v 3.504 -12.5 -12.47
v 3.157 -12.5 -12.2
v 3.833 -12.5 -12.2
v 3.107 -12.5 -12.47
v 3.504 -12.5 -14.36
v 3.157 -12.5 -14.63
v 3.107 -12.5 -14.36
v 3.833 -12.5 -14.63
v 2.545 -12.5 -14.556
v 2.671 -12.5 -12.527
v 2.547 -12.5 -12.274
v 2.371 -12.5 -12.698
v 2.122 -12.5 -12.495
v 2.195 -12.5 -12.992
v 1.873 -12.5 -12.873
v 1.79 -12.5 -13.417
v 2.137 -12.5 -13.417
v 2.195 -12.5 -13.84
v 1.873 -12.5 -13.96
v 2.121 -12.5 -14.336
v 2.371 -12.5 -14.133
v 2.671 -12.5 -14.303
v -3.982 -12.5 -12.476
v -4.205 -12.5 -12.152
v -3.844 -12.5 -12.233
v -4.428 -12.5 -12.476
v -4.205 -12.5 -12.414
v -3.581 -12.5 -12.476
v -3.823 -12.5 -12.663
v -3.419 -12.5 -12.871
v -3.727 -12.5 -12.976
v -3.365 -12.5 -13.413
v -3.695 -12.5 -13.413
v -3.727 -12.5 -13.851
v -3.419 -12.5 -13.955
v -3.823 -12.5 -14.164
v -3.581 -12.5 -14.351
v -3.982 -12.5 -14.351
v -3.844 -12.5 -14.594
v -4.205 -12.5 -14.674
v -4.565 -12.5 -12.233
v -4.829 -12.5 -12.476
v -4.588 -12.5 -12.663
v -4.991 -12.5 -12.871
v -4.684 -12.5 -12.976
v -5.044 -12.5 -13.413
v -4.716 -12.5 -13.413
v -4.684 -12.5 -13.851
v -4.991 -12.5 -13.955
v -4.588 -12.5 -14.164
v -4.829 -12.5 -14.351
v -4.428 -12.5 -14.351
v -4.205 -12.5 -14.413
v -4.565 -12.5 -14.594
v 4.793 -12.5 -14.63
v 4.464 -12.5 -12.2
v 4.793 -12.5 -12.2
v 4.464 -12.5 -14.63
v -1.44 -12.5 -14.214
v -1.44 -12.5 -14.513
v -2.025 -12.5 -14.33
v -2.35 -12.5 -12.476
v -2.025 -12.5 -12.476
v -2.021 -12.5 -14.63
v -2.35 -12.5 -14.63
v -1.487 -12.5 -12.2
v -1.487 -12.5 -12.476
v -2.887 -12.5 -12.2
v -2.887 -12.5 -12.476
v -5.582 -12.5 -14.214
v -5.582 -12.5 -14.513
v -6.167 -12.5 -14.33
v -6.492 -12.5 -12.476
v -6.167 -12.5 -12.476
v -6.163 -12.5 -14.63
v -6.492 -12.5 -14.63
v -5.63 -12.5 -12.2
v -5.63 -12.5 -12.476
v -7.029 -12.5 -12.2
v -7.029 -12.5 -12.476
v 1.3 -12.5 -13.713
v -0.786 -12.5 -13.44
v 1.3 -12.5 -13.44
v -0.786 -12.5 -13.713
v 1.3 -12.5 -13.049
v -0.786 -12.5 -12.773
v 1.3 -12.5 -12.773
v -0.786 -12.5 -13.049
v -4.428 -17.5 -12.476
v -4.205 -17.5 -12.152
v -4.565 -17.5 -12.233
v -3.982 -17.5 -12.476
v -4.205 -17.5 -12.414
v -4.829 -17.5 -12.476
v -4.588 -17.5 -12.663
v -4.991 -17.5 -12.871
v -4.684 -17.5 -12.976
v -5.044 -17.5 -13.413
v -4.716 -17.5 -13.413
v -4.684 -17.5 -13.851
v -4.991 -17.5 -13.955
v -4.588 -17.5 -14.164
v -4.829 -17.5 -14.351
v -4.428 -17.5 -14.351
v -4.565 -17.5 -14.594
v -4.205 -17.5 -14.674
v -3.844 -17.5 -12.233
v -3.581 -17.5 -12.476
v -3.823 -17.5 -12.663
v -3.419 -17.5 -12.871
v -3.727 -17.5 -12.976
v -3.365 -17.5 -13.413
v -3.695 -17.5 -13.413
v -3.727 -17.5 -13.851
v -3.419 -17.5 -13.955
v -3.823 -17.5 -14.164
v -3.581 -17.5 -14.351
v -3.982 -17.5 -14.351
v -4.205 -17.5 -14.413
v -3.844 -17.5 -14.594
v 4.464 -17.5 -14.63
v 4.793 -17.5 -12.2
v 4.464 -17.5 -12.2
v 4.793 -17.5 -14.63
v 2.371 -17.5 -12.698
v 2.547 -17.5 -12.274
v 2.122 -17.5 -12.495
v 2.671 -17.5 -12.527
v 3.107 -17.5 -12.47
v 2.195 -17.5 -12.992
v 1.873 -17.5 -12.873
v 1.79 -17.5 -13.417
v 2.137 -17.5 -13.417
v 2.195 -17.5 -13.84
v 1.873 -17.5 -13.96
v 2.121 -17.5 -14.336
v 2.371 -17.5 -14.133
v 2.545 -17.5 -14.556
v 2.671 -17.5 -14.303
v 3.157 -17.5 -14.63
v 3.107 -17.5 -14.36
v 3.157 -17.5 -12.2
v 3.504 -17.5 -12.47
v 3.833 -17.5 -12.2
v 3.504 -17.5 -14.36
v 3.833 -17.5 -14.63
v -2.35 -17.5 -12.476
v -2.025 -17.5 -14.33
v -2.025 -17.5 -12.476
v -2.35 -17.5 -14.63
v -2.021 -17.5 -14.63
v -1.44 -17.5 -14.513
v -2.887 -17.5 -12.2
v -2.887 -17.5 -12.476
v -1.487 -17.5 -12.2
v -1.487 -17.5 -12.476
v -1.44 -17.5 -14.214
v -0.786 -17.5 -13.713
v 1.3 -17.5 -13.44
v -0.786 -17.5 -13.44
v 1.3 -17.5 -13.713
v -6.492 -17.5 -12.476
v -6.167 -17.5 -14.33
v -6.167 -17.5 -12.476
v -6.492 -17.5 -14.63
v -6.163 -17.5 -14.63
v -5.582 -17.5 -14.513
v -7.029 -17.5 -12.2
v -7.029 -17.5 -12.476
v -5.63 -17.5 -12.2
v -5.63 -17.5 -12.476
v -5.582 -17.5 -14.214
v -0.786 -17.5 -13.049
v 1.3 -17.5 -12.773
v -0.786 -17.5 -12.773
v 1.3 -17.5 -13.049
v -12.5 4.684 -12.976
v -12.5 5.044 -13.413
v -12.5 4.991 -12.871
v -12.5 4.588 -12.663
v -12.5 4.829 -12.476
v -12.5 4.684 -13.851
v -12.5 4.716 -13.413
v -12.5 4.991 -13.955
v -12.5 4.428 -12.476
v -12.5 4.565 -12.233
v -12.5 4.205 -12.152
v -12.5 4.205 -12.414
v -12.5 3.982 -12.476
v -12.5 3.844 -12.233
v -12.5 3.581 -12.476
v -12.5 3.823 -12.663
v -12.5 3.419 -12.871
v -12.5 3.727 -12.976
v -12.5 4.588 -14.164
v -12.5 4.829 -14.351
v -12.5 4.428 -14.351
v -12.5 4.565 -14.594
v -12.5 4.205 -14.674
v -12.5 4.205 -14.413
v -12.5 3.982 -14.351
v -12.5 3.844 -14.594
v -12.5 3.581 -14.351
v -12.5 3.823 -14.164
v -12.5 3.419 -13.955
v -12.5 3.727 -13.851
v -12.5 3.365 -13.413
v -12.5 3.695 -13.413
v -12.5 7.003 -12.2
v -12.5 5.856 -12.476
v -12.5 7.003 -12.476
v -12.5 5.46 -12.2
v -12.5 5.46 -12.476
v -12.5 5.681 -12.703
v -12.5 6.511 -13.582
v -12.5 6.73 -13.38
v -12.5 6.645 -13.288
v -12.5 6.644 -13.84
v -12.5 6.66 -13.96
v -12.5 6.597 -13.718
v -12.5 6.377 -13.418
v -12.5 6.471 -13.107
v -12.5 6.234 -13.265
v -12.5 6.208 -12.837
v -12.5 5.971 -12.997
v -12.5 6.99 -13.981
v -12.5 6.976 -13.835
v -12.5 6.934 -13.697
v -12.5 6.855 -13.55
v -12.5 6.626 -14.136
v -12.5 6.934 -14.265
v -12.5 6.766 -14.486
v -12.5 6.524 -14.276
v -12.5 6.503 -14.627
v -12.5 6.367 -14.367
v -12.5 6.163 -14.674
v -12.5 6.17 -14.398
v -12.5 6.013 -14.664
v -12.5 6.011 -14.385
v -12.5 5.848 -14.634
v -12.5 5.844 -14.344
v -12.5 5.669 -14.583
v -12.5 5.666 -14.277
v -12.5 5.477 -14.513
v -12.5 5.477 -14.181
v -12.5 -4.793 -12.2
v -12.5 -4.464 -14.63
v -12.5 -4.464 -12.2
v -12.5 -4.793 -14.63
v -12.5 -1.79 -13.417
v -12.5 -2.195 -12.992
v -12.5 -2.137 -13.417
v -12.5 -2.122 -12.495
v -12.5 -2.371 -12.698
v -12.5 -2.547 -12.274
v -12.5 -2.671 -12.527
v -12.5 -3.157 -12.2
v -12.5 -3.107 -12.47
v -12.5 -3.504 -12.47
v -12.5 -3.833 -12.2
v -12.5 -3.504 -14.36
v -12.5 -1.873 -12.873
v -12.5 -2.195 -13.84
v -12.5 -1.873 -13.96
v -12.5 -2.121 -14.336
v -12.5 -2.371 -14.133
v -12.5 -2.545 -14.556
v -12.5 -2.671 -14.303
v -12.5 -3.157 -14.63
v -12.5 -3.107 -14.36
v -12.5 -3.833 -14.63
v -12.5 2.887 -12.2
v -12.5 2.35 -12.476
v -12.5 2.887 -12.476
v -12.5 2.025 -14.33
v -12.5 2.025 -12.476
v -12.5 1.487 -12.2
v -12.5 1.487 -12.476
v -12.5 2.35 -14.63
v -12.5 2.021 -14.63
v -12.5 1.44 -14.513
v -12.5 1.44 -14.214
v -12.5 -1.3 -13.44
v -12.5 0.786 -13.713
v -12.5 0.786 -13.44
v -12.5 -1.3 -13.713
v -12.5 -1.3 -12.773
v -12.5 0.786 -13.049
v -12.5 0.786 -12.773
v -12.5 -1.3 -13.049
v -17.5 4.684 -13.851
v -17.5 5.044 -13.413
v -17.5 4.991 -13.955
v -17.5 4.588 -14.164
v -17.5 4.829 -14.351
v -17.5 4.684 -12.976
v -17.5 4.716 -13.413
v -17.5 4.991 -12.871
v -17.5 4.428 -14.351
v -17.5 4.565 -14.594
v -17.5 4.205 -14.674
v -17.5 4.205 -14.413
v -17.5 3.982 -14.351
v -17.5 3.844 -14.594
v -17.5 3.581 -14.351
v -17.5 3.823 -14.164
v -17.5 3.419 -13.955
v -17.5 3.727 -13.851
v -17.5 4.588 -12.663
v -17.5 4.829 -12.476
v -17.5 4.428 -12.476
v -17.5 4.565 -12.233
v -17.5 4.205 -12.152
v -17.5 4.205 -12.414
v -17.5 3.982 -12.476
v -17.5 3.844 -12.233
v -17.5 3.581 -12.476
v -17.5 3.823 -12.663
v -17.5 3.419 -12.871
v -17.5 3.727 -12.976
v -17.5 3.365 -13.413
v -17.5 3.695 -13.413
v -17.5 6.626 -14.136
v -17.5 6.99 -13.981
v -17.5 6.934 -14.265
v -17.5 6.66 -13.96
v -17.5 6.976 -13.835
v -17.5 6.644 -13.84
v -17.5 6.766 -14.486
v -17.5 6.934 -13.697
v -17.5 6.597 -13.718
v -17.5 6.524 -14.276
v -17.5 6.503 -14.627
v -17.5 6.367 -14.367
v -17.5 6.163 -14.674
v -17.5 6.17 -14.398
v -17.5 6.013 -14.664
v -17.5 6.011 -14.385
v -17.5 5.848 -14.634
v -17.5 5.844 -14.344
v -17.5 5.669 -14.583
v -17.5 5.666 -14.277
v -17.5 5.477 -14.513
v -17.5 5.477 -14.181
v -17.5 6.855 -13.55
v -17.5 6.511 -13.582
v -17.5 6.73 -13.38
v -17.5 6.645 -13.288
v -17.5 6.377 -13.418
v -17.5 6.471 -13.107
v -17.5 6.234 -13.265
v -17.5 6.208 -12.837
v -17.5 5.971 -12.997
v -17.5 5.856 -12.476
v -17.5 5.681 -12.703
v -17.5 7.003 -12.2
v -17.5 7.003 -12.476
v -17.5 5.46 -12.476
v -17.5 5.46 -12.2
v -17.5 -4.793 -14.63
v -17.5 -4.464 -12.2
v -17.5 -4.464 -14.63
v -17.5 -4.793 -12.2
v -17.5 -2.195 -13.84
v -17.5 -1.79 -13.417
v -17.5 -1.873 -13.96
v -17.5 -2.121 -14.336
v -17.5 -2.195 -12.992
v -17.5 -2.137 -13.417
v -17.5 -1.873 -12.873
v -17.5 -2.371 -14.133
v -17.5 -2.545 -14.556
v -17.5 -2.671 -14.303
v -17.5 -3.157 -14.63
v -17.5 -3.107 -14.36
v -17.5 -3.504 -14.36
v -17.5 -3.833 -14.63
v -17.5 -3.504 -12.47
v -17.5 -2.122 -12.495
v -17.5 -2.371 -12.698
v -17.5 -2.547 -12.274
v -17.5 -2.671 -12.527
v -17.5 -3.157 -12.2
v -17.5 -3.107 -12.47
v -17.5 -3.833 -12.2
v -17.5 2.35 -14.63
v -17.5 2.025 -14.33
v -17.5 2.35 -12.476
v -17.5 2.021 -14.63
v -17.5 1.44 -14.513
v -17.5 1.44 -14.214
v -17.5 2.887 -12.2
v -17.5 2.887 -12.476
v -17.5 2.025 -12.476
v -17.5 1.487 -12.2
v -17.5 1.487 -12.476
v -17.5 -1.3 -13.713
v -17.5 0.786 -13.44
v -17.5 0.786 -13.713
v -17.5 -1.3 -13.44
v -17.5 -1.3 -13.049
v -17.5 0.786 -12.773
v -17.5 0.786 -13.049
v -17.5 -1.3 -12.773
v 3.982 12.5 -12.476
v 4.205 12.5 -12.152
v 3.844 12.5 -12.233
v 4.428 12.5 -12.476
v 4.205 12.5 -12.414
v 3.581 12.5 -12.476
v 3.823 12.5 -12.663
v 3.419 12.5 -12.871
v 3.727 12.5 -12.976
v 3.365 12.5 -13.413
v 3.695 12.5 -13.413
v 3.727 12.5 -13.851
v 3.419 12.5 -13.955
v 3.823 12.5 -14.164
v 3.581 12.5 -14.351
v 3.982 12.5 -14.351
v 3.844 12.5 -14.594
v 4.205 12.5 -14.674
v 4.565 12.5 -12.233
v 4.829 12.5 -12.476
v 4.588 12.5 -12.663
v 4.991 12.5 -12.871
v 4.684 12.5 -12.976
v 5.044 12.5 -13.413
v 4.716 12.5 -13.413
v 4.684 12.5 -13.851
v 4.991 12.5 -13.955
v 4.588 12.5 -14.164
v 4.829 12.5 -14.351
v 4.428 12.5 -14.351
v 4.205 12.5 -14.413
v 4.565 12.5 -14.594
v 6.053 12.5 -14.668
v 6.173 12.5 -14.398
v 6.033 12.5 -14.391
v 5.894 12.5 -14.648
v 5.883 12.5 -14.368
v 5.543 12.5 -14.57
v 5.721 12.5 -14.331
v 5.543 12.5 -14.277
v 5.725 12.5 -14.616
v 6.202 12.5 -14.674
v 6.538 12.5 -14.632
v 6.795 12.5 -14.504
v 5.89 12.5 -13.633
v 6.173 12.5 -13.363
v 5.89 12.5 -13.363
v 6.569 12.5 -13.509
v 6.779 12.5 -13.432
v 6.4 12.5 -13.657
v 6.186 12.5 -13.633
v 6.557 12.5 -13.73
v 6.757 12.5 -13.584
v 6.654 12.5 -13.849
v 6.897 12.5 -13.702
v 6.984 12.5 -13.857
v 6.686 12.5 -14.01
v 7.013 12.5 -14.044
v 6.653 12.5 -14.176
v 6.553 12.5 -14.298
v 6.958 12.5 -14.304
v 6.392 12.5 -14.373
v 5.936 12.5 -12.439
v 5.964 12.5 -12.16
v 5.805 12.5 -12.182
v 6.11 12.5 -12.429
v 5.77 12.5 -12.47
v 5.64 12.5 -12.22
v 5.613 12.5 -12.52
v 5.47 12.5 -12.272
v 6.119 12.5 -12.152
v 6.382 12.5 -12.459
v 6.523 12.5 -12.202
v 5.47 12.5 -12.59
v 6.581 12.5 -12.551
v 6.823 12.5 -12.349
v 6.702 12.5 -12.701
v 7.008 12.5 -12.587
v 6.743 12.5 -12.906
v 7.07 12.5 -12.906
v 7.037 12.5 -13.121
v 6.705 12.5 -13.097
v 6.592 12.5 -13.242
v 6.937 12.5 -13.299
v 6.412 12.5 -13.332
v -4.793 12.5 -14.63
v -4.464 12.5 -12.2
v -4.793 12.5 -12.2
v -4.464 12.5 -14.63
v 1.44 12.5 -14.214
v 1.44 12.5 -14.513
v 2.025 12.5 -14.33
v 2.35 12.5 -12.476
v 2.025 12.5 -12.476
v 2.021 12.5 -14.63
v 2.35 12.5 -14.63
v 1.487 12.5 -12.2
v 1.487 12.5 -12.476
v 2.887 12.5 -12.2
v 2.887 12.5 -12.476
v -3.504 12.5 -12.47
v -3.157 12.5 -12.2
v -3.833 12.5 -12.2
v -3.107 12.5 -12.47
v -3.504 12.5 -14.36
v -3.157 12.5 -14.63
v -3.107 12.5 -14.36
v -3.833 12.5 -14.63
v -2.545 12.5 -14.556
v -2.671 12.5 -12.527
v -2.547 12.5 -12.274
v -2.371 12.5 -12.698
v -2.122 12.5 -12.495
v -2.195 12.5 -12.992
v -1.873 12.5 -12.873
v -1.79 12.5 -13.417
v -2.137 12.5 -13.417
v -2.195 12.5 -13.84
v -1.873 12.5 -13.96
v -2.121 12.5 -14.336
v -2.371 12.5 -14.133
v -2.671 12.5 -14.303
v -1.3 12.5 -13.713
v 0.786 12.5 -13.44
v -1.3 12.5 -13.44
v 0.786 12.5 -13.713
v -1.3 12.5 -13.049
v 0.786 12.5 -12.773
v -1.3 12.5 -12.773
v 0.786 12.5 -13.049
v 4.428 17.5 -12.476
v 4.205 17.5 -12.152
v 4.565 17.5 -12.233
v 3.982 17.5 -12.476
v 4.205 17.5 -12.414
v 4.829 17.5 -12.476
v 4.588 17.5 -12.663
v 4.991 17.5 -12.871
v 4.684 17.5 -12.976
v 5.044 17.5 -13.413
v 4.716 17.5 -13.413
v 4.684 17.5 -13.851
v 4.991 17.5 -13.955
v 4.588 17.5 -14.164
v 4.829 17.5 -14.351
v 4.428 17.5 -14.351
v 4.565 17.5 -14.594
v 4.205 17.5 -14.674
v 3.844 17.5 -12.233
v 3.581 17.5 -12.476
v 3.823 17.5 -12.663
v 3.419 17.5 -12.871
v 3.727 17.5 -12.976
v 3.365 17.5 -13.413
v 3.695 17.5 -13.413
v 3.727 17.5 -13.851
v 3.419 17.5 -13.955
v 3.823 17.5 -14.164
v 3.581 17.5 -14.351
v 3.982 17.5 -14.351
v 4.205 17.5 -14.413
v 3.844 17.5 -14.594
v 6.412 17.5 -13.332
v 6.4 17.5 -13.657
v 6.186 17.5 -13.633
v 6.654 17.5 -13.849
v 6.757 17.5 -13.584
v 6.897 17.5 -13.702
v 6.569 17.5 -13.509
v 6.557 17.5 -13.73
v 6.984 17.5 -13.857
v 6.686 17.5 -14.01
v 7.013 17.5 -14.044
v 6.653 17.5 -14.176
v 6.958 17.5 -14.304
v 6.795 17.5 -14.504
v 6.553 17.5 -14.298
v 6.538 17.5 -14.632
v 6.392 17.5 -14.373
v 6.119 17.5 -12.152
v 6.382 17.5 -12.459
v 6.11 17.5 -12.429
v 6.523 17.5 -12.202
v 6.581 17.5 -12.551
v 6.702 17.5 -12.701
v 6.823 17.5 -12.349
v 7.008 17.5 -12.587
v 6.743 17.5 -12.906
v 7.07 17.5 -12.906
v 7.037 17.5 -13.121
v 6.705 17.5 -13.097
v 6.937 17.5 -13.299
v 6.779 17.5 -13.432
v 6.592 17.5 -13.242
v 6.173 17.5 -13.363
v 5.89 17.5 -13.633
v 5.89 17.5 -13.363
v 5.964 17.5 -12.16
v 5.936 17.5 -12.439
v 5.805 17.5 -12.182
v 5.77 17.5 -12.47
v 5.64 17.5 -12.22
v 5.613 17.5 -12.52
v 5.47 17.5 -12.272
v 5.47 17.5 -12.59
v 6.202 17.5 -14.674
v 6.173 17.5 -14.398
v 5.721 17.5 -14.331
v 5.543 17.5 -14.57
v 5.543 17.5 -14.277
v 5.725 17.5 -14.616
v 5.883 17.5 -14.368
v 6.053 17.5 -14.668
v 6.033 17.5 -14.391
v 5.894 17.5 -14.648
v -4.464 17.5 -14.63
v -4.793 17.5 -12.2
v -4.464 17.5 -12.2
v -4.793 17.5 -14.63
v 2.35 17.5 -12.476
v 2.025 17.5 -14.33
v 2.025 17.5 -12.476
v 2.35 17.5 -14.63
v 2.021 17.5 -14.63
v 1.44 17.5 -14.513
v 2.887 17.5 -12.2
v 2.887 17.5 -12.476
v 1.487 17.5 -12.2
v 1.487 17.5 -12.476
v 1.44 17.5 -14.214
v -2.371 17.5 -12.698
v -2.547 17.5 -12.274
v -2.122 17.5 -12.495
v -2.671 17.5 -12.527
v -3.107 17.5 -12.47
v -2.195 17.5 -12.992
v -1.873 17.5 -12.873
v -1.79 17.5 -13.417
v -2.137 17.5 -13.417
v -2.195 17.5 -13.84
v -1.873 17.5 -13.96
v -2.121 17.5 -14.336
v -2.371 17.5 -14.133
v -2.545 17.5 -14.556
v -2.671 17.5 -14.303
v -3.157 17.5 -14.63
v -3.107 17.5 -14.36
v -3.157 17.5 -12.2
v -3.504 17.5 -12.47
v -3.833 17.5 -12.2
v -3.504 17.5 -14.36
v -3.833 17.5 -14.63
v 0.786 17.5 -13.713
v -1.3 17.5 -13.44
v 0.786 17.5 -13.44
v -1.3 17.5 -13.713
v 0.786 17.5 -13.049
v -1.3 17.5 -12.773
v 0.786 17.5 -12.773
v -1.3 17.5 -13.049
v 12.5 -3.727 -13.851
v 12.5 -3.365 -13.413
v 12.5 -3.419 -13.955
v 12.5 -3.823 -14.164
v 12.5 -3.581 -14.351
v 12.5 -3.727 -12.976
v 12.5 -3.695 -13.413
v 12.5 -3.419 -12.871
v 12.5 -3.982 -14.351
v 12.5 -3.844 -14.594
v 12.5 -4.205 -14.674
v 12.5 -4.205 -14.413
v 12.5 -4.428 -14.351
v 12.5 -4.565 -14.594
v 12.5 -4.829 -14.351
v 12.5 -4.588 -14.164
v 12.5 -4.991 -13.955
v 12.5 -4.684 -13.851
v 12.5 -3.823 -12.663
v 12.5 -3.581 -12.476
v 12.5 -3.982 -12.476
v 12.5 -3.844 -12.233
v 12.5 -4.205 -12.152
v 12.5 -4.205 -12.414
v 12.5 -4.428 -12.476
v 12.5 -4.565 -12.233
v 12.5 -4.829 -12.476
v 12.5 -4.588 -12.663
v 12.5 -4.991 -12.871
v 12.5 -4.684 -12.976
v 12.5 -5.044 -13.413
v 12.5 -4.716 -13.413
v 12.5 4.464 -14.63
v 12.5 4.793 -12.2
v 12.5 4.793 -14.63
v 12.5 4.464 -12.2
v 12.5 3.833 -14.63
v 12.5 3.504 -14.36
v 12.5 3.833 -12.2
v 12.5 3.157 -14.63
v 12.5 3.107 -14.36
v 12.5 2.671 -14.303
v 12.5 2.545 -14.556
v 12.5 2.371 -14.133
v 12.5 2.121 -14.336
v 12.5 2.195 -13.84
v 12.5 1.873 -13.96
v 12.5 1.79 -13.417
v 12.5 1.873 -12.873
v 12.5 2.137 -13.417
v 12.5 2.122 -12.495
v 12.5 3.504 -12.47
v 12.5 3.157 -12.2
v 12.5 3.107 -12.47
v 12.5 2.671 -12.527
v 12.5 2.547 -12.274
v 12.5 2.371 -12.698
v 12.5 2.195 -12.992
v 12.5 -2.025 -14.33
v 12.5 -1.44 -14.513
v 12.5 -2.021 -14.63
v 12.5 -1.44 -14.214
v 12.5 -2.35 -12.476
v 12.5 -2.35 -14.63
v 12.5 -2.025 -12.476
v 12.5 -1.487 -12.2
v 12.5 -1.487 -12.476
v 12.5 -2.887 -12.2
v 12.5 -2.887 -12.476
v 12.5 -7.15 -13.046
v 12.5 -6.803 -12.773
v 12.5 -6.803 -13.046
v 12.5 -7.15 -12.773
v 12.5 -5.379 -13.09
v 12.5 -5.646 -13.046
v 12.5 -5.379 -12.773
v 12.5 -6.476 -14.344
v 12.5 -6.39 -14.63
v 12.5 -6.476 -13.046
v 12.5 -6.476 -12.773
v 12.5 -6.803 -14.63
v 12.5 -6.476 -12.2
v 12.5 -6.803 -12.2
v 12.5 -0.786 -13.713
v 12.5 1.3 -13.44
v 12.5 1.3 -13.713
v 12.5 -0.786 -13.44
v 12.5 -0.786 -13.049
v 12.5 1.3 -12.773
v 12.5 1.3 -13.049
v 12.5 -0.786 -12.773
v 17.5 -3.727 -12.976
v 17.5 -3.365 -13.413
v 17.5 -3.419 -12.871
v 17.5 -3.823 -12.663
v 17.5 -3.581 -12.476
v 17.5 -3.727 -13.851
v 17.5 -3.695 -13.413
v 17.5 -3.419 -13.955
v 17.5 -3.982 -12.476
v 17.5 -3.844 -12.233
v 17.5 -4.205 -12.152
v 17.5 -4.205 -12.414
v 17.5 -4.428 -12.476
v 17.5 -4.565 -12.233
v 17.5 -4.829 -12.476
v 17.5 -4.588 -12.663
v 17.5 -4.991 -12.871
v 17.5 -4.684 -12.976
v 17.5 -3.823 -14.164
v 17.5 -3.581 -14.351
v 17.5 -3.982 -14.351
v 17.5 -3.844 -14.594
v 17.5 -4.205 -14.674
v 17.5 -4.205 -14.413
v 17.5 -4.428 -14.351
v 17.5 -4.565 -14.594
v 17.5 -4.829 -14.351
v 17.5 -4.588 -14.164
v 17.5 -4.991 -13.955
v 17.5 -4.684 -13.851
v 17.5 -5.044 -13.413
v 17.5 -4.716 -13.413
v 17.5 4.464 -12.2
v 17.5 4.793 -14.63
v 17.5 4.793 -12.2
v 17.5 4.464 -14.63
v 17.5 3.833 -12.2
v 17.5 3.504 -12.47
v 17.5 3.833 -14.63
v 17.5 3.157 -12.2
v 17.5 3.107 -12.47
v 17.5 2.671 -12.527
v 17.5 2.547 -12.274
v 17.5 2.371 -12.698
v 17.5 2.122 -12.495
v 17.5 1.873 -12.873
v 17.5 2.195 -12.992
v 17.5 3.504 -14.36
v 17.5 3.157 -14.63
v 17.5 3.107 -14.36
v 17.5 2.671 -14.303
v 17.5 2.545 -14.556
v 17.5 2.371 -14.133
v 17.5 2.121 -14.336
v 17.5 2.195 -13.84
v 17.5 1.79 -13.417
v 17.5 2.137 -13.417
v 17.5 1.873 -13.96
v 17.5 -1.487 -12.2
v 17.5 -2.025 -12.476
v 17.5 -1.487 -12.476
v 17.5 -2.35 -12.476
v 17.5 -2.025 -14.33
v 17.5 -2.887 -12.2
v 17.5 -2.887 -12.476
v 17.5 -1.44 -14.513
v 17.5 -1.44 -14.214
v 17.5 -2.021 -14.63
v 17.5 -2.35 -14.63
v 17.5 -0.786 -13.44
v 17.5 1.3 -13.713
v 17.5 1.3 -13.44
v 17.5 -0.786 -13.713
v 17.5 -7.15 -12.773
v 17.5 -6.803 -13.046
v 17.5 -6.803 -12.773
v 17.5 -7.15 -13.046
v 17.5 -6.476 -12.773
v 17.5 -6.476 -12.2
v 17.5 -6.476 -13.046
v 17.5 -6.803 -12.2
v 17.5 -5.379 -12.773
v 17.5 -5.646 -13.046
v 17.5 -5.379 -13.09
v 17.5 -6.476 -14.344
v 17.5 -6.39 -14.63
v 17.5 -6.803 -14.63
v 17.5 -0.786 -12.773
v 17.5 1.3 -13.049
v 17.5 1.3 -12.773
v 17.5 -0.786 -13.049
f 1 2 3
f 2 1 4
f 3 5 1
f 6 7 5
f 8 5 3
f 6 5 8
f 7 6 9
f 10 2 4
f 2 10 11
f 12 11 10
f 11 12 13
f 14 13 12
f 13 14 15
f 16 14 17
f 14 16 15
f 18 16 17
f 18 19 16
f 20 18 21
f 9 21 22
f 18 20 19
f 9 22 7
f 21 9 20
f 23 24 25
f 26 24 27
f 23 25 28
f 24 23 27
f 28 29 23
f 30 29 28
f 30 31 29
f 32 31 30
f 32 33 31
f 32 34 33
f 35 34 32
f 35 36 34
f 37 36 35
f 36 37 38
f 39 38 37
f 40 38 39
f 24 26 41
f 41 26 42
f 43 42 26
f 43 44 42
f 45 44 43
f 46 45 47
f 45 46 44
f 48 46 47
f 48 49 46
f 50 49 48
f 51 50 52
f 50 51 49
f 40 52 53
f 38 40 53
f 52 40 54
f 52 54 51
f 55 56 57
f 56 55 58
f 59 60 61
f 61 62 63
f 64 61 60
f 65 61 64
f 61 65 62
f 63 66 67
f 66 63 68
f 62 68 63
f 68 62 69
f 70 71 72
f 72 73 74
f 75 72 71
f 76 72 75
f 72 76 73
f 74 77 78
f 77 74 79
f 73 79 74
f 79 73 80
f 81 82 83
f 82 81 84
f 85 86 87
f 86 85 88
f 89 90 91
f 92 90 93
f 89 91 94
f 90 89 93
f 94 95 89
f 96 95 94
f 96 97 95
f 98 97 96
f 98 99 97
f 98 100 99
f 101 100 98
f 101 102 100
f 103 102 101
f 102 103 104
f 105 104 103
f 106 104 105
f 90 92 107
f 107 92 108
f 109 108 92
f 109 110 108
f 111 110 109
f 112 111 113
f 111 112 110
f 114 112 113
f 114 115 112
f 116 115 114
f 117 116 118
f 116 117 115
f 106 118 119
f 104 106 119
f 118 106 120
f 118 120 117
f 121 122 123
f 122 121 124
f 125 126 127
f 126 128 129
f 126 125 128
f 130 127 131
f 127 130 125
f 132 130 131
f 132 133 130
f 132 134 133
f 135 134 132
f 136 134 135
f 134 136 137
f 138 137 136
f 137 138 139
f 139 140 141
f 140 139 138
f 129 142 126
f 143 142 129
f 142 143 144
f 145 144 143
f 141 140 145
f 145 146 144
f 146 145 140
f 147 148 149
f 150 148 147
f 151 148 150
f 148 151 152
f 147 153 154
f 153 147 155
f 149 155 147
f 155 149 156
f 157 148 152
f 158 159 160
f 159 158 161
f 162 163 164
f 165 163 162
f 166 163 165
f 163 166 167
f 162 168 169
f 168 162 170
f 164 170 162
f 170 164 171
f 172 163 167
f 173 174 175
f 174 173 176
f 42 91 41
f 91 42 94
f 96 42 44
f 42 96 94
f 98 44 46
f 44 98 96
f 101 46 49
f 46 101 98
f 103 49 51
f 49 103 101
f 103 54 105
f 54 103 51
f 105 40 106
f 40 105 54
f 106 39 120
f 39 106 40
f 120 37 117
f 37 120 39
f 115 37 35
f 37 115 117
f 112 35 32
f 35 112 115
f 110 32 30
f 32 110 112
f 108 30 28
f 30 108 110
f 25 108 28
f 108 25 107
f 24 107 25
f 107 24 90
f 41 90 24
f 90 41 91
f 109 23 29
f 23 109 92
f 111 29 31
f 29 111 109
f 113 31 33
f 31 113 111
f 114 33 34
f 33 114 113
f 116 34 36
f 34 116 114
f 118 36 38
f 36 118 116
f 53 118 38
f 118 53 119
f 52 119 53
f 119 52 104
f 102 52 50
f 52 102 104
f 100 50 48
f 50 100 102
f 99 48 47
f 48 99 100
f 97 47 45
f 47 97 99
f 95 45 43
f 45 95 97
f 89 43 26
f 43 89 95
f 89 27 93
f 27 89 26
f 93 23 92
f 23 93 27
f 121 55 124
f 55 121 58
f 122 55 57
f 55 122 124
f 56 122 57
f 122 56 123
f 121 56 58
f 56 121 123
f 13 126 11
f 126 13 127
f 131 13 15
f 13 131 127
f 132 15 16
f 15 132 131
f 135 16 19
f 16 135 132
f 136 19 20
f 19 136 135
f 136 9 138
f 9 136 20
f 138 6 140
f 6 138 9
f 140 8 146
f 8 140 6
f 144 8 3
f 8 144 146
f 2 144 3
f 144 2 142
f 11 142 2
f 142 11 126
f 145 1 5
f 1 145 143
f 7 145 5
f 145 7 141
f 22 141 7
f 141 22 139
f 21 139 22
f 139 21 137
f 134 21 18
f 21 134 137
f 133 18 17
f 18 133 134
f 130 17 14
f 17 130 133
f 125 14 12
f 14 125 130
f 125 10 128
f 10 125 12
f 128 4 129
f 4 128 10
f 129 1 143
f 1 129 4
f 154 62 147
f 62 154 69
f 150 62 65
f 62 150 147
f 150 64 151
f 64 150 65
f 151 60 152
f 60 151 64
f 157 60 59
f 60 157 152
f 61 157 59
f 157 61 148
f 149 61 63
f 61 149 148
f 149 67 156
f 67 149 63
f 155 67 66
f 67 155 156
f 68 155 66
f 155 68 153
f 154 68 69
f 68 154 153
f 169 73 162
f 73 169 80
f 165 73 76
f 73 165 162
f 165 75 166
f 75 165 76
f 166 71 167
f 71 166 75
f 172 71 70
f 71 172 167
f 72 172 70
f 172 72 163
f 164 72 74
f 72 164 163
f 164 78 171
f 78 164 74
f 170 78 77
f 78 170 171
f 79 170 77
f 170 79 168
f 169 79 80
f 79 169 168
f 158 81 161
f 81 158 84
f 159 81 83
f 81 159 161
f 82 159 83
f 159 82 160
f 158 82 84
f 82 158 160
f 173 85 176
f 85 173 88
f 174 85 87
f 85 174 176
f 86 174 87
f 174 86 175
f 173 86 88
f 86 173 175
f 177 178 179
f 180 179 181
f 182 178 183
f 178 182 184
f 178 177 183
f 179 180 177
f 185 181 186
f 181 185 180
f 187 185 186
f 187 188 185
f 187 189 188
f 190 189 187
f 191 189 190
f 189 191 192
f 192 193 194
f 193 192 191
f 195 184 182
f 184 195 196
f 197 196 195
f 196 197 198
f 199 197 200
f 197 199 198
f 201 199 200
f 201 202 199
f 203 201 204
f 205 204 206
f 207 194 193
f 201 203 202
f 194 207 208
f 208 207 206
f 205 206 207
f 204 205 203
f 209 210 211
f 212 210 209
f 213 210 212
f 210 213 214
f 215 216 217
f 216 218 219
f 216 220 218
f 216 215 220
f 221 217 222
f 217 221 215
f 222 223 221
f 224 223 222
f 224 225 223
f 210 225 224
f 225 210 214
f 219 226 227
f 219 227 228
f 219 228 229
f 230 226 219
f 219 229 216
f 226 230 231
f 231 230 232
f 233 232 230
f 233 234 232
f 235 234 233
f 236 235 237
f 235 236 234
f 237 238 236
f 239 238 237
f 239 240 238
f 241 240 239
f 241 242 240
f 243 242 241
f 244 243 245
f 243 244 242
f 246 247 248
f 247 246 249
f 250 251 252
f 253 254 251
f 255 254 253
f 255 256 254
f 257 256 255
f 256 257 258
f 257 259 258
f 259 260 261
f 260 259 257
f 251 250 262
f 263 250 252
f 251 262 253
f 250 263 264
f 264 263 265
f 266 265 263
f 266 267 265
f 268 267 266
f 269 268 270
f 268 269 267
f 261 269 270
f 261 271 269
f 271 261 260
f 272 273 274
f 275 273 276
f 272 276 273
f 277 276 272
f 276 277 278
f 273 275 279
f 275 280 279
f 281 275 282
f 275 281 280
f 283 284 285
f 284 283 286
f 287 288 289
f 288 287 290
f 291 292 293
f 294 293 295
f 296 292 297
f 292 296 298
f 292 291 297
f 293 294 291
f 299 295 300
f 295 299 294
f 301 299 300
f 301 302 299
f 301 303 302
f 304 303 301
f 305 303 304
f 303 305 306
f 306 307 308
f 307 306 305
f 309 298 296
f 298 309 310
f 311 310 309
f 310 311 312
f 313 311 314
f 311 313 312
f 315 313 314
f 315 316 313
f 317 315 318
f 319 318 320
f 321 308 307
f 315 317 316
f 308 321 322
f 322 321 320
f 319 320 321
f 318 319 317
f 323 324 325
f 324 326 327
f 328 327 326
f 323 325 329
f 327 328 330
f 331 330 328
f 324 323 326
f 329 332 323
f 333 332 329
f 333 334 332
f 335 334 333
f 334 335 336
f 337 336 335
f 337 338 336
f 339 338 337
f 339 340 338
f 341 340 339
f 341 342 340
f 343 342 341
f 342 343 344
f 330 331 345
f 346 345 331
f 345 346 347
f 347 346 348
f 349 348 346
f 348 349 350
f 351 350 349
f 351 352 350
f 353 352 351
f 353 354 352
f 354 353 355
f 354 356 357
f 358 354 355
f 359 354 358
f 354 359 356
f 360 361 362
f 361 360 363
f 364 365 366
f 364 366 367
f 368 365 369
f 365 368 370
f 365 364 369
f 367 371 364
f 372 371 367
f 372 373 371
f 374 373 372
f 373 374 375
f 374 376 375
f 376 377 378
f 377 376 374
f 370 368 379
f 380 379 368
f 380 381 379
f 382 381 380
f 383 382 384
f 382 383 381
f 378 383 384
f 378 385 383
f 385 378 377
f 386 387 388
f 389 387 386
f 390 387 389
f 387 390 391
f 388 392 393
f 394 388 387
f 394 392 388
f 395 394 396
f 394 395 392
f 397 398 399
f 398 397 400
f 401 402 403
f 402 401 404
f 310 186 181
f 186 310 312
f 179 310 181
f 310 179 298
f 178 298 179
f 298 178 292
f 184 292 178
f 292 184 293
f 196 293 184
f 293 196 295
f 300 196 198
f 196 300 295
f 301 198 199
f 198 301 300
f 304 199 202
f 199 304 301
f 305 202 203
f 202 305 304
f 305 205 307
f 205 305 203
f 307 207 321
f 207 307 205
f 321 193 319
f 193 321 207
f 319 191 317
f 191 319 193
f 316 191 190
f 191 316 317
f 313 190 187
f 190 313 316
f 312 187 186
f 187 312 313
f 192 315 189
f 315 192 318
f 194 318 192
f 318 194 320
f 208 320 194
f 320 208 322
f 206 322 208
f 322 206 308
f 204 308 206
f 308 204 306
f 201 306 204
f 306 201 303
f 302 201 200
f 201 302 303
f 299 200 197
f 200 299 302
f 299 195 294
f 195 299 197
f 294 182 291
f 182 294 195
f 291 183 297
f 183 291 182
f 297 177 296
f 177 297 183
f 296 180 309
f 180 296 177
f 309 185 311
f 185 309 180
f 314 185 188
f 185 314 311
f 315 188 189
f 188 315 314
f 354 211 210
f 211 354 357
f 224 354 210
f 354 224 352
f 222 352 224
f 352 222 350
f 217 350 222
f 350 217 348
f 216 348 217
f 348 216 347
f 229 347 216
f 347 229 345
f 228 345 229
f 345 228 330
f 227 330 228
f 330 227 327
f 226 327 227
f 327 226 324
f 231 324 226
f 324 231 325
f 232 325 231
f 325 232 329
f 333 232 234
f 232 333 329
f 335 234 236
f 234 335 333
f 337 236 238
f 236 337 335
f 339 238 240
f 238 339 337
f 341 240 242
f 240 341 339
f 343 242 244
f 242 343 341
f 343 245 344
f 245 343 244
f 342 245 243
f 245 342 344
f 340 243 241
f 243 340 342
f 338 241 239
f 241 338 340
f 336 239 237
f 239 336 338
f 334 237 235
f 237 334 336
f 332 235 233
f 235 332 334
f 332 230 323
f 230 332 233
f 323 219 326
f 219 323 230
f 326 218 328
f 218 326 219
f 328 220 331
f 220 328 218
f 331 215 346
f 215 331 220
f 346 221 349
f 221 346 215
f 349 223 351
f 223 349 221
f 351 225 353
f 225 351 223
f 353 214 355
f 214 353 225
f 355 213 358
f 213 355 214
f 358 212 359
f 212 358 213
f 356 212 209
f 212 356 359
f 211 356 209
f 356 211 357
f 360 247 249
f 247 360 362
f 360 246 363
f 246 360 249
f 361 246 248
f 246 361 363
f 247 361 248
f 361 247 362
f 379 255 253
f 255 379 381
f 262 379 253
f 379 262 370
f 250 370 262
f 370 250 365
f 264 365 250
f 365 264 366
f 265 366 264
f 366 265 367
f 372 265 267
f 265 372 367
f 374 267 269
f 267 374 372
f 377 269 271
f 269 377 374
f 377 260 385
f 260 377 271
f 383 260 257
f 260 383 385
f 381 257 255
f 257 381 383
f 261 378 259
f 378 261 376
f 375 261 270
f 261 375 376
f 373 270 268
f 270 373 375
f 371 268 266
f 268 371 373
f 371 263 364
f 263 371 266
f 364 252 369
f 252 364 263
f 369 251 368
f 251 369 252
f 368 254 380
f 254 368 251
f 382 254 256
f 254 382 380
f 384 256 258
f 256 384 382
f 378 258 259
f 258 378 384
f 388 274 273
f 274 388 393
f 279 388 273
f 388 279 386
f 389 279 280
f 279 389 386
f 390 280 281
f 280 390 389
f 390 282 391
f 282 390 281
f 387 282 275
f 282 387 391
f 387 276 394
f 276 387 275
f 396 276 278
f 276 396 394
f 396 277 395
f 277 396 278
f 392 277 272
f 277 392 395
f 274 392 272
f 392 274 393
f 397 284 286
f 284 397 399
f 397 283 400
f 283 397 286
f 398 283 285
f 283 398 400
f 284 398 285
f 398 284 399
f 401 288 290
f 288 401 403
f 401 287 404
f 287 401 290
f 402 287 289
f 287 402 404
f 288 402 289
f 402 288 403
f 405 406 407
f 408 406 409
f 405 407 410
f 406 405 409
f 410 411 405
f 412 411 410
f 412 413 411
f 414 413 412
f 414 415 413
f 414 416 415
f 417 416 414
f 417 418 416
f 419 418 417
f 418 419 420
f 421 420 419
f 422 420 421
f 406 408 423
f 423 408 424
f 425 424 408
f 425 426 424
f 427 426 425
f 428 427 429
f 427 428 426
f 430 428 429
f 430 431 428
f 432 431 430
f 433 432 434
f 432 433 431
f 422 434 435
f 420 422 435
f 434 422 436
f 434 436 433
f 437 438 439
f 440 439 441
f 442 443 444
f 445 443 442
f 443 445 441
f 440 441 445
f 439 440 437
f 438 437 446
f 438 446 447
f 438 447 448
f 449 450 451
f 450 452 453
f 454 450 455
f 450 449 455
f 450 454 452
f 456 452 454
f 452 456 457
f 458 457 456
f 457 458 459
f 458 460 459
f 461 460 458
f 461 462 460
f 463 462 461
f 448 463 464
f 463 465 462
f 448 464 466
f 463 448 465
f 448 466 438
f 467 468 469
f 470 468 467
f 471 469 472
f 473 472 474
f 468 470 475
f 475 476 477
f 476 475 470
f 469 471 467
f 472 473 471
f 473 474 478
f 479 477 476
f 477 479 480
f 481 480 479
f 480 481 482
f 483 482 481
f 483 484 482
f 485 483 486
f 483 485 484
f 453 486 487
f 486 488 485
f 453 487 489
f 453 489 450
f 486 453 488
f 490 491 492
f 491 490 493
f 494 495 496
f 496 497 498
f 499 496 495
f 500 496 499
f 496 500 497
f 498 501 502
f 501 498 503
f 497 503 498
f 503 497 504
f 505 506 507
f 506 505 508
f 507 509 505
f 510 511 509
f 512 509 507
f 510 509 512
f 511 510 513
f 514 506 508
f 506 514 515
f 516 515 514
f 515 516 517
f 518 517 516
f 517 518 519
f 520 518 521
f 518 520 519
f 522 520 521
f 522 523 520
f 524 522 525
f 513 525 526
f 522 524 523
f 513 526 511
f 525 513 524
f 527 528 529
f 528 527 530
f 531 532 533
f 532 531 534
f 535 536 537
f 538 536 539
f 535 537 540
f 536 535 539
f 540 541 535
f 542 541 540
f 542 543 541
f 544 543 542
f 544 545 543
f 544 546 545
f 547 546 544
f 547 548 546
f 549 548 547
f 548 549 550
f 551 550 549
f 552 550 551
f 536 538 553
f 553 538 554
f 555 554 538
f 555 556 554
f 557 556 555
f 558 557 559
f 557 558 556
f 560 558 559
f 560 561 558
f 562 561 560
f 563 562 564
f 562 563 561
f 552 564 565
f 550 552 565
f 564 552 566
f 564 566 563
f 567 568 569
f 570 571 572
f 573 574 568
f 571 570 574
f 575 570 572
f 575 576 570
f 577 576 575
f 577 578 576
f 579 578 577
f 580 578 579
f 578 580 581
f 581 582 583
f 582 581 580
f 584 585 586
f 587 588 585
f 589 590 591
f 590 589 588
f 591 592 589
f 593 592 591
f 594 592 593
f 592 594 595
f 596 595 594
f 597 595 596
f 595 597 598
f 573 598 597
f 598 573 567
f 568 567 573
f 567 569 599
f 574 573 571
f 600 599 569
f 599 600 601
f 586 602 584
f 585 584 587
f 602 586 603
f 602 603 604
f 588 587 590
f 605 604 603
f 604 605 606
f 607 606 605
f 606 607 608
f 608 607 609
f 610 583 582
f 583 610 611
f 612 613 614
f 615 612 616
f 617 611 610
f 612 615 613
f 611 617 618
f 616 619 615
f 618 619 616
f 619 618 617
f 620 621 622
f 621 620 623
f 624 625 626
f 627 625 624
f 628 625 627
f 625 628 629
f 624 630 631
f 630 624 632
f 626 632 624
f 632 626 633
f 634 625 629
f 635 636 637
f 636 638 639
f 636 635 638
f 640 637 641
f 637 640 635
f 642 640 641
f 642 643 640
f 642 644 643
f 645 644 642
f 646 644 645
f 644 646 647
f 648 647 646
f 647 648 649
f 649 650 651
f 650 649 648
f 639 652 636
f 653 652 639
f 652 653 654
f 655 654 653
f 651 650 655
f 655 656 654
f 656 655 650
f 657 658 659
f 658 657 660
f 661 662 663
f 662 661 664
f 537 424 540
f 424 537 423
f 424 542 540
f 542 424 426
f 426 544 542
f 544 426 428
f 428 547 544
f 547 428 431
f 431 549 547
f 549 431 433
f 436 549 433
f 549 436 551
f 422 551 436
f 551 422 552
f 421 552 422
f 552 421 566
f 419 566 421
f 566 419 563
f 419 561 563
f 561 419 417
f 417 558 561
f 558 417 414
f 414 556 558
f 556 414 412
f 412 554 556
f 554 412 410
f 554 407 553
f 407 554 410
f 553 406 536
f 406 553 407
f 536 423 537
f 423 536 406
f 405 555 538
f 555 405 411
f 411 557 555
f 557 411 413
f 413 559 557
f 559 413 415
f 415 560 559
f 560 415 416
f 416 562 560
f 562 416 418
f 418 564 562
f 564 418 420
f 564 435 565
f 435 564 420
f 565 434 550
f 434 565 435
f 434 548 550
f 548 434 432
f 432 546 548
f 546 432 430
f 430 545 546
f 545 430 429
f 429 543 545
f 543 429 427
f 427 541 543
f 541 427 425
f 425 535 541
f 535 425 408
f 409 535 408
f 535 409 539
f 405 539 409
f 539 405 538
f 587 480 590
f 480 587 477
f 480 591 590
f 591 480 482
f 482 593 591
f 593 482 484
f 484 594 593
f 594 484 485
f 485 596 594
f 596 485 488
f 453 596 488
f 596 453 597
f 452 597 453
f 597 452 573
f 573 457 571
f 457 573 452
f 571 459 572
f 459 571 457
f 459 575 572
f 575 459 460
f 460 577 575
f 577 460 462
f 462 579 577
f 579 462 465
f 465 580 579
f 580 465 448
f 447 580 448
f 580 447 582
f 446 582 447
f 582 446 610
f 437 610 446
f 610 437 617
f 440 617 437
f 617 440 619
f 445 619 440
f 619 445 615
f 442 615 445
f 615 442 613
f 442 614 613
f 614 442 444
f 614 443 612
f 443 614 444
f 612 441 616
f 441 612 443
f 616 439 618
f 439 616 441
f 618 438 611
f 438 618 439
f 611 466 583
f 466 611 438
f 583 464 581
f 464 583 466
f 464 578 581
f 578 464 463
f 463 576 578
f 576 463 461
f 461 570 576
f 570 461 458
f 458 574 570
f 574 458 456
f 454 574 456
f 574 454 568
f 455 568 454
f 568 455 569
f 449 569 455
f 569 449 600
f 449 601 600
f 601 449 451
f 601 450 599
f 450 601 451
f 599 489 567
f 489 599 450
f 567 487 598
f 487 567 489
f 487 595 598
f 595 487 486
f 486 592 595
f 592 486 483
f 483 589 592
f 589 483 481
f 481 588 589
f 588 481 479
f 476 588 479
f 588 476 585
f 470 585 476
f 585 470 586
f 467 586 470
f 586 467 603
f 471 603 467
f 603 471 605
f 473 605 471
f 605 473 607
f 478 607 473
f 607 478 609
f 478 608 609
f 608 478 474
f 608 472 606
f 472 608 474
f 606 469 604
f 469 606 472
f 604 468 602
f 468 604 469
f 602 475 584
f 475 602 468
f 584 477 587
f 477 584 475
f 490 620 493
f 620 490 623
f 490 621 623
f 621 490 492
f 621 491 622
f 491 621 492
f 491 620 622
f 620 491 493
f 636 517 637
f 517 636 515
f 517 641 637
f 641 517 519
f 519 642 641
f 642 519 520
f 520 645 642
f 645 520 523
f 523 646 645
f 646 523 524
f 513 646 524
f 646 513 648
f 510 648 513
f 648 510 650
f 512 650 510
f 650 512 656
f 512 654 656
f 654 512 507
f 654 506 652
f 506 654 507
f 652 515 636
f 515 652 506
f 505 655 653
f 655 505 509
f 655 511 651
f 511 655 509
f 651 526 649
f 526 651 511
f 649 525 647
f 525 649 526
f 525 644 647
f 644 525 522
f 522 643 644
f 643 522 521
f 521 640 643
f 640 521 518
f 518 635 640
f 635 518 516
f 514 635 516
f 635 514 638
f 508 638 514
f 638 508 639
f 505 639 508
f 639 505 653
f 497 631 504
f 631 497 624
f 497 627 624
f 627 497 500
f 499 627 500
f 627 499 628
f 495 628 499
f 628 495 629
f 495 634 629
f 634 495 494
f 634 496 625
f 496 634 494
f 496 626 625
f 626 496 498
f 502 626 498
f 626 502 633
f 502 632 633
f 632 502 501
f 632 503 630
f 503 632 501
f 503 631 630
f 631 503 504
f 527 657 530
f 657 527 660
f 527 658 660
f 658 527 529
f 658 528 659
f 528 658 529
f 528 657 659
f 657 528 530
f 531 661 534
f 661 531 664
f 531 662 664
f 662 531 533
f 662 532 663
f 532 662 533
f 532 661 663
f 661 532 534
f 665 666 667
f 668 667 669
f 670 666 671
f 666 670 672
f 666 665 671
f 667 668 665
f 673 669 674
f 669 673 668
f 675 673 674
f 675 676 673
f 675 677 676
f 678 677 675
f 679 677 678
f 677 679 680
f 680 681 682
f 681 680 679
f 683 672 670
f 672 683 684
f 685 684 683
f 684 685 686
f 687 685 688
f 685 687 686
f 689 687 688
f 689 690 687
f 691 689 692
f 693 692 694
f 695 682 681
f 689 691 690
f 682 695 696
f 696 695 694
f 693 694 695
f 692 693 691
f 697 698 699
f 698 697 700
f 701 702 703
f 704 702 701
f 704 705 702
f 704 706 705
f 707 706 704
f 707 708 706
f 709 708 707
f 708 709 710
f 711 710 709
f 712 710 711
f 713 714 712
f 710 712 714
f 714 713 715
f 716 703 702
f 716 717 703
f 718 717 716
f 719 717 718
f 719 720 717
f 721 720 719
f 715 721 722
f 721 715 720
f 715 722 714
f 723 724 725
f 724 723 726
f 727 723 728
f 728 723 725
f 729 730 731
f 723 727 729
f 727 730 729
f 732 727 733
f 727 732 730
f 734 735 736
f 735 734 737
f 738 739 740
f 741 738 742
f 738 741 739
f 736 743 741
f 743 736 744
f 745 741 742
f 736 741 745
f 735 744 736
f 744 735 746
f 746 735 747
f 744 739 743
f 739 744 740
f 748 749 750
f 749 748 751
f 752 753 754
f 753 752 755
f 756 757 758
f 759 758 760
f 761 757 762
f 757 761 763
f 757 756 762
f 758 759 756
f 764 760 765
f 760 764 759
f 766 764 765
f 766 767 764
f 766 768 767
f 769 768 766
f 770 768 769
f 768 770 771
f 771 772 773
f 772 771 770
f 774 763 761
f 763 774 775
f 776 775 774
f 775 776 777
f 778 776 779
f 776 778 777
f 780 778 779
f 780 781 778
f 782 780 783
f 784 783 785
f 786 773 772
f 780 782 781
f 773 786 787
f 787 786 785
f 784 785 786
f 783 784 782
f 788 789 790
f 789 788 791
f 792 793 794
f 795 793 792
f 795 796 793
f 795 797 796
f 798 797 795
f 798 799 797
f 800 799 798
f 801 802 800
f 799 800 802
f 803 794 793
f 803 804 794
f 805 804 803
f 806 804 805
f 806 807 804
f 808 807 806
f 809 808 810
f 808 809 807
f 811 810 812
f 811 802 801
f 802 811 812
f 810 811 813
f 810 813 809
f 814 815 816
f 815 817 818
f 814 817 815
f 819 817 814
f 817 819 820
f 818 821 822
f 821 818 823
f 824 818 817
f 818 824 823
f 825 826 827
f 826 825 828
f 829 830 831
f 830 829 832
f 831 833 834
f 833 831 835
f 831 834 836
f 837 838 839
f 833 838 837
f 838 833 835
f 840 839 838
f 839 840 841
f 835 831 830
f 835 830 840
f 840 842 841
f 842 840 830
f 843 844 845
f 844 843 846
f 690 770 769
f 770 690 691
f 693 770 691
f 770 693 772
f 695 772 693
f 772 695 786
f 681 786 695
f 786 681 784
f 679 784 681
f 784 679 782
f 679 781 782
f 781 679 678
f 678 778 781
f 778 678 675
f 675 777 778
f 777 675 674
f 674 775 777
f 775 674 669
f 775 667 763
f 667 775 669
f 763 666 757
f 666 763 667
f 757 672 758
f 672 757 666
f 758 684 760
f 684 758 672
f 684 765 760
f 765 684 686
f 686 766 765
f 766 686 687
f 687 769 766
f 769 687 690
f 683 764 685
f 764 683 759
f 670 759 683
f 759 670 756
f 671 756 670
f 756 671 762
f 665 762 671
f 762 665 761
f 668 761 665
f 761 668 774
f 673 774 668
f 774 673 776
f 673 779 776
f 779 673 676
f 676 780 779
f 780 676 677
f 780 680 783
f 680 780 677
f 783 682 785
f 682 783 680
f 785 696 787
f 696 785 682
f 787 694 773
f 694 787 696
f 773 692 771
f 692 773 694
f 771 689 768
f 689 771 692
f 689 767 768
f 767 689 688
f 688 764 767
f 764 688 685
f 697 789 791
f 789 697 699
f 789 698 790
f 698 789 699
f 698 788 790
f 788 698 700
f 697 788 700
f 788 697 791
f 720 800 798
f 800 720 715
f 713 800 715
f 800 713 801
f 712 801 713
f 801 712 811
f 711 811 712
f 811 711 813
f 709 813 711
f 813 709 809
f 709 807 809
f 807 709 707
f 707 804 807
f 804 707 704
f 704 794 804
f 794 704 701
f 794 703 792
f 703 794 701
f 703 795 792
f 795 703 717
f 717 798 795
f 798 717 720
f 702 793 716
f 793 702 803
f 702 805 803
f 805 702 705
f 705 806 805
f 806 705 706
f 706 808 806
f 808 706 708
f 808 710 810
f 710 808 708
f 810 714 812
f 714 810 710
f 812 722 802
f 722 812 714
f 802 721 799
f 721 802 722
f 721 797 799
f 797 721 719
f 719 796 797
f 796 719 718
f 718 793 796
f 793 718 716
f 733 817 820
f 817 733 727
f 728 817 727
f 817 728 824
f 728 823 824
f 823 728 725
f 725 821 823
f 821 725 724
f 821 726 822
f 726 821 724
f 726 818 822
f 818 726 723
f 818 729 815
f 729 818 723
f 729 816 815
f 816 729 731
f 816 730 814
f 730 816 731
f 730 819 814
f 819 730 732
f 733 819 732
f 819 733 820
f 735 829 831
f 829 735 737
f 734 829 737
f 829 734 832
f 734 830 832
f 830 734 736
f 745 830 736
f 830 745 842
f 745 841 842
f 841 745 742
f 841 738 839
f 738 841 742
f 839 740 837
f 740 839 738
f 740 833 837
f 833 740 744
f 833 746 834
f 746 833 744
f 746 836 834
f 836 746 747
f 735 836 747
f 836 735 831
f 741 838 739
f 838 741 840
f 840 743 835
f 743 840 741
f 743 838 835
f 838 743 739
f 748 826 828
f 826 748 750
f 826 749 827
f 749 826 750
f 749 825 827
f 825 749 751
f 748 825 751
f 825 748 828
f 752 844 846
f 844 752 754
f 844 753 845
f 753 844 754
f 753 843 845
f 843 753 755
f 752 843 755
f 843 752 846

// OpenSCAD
// file: modules.scad
offset = [0,8,0];
zoom = [0.8,0.8,1];

module white( filename, text)
{
    translate(offset+[0,-4,0])   scale(zoom)
    rotate([180,0,-90]) 
    union(){ 
        translate([-14,-6.4,-2.5])   rotate([0,0,90])  linear_extrude(5)  text (text,font="bold",size=3); 
        intersection() 
        {    
            cube([35,35,5],center=true); 
            translate([1.5,0,2.6])   linear_extrude(5) scale([0.14,0.14,-1])surface(file = filename, center = true); 
        } 
    } 

};

module black( filename, text)
{
    translate(offset+[0,-4,0])   scale(zoom)
    rotate([180,0,-90]) 
    difference() 
    {    
        cube([35,35,5],center=true); 
        translate([1.5,0,2.6])    scale([0.14,0.14,-1]) surface(file = filename, center = true);
        translate([-14,-6.4,-2.5])   rotate([0,0,90])  linear_extrude(6)  text (text,font="bold",size=3);
    } 
}

module shape()
{
    translate(offset)   scale(zoom) rotate([180,0,0]) 
    {
        rotate([0,0,90]) translate([5,0,0])  cube([35,35,5.5],center=true);  
        linear_extrude(5)  translate([-9,-4,0])   text("B",size=20);
    }
    
}
// main file
include <modules.scad>

union() color([0,1,0]) translate([0,0,-1]) rotate([-90,0,0])
{
    translate([0,-4,-15])                     white("../aruco/Marker101.png","ID=101");
    rotate([0,90,0])   translate([0,-4,-15])  white("../aruco/Marker102.png","ID=102");
    rotate([0,180,0])   translate([0,-4,-15]) white("../aruco/Marker103.png","ID=103");
    rotate([0,270,0])   translate([0,-4,-15]) white("../aruco/Marker104.png","ID=104");
}    
